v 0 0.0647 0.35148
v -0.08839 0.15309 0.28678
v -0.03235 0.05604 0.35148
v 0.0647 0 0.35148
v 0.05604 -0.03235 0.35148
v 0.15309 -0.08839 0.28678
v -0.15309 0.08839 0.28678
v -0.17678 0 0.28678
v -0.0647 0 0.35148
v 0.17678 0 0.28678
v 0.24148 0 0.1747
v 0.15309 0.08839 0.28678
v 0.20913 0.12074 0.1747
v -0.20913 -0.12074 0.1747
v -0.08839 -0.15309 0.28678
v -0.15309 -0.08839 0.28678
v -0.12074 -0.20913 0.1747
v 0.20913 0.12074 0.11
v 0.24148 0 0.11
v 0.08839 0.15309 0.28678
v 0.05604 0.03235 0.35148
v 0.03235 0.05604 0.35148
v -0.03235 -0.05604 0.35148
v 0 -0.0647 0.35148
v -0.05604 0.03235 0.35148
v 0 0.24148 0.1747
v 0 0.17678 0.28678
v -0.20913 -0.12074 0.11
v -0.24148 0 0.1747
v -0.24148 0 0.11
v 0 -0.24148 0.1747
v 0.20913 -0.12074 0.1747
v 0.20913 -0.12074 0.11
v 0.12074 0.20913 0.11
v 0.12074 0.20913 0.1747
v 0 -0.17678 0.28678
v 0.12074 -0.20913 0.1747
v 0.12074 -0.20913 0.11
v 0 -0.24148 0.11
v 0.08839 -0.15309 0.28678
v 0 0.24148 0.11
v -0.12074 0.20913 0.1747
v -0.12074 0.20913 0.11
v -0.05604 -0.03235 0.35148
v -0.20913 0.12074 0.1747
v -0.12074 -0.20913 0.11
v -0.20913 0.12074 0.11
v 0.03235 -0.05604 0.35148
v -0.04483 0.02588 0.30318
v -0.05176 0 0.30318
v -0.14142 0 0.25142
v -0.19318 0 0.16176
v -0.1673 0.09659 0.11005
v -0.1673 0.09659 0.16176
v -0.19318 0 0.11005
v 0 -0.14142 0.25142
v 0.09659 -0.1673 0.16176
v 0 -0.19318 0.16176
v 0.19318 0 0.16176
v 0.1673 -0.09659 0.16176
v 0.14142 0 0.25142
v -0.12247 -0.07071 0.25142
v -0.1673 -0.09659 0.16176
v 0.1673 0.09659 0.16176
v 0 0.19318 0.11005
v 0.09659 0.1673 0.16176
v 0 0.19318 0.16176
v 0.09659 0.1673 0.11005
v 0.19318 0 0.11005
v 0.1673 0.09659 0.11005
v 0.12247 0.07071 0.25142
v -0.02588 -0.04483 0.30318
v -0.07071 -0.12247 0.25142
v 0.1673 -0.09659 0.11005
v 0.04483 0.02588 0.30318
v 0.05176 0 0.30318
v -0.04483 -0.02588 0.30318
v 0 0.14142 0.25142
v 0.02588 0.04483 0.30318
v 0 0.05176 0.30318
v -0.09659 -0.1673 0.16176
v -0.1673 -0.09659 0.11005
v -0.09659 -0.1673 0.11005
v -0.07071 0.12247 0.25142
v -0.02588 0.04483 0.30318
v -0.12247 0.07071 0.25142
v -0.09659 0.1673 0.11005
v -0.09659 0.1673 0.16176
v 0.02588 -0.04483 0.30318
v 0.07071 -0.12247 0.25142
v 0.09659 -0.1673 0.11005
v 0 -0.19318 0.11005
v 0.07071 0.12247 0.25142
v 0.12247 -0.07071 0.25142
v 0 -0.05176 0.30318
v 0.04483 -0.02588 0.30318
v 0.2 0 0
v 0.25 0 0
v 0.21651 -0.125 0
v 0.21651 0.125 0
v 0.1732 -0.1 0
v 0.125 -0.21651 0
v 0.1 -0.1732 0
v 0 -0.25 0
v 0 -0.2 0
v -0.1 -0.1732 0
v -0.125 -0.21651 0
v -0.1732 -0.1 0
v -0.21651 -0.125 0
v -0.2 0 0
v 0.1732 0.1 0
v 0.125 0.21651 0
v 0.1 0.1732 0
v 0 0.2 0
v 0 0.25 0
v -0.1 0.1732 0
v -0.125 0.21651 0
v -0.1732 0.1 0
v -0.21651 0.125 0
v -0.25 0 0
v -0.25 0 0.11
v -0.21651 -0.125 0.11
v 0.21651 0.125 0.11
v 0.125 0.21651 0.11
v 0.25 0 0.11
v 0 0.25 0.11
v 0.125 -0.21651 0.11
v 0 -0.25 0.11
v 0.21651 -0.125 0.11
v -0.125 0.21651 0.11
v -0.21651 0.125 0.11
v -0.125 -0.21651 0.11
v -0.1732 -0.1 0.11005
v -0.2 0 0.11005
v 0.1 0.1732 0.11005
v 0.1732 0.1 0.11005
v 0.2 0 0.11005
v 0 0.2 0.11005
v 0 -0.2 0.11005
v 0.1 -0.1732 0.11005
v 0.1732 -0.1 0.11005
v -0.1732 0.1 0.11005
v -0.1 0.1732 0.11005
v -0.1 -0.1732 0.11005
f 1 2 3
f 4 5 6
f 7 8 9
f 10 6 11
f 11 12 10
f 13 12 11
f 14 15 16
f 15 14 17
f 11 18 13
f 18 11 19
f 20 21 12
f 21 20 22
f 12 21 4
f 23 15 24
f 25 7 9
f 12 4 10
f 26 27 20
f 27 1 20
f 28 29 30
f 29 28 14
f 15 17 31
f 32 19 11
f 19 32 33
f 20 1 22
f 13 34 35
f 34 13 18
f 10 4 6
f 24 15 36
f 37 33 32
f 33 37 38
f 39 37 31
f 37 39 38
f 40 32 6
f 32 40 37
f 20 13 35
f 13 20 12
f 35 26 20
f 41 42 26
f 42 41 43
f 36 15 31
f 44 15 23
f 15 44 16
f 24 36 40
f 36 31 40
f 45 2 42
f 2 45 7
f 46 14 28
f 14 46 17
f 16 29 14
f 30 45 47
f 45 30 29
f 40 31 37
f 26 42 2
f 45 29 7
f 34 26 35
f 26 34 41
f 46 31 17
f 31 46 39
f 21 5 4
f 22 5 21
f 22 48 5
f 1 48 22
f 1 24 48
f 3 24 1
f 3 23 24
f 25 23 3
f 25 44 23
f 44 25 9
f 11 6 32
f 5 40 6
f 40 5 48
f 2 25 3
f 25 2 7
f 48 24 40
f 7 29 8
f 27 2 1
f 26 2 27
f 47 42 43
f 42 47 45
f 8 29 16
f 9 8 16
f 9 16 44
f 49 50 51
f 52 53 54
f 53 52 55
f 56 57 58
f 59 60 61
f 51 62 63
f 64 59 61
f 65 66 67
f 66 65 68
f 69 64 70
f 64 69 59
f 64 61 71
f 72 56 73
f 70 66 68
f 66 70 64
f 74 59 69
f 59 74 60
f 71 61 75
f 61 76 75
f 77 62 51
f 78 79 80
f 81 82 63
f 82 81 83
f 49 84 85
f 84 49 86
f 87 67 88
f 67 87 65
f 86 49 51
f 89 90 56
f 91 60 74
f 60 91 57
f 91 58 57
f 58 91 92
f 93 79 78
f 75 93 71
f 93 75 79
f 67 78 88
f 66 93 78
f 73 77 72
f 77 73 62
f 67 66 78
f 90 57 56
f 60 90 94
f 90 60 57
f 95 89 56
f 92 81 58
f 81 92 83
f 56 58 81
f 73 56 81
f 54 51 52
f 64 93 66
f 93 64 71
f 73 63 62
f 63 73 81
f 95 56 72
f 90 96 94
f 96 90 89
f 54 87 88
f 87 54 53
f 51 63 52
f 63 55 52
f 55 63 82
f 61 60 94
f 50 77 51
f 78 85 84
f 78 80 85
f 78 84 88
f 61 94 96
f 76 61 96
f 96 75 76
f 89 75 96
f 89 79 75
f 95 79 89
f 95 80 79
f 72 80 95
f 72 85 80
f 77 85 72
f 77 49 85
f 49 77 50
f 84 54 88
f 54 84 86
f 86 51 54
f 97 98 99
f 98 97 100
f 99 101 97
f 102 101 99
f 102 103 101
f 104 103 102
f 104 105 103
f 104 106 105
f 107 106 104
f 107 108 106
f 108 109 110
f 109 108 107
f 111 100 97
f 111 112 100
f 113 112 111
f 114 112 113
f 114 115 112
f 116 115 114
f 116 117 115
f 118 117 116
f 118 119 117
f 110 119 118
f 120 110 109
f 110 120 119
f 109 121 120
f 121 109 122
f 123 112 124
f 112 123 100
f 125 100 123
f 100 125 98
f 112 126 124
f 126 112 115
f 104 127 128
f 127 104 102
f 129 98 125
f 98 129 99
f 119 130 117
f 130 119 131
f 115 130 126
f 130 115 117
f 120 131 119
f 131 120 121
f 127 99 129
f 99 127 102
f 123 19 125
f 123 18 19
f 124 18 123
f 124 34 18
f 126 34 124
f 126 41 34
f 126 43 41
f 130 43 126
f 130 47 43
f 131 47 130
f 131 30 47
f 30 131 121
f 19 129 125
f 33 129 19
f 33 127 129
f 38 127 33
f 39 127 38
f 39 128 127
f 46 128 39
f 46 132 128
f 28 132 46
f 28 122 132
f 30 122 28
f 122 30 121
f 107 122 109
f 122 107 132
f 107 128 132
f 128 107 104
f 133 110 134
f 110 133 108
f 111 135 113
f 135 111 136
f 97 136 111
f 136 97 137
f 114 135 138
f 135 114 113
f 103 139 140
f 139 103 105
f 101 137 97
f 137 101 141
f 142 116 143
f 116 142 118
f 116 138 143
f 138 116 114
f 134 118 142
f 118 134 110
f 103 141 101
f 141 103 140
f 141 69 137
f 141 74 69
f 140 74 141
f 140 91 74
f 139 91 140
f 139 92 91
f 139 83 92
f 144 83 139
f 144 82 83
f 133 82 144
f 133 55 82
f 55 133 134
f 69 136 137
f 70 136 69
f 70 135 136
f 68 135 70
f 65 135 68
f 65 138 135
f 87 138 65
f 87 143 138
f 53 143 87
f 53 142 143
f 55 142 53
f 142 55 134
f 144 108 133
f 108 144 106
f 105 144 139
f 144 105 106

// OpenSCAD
eps = 0.0001;
hole_attach_height = 0.02;
outer_radius = 0.25;
hole_radius = 0.045;
thickness = 0.05;
hole_twist = 0;
//other params
inner_radius = outer_radius - thickness;
fn = 12;
fnh = 6;

difference() {
    union() {
        difference() {
            //sphere
            translate([0,0,hole_radius*2 + hole_attach_height])
            sphere(r=outer_radius, $fn = fn);
            
            //shelling
            translate([0,0,hole_radius*2 + hole_attach_height])
            sphere(r=inner_radius, $fn = fn);
            
            translate([0,0,-outer_radius])
            cylinder(h=outer_radius, r= outer_radius, $fn = fn);
        }
        
        //attach segment
        cylinder(h=hole_radius*2 + hole_attach_height, r = outer_radius, $fn = fn);
    }
    
    translate([0,0,-outer_radius -eps/2])
    cylinder(h=hole_radius*2 + hole_attach_height + outer_radius + eps, r = inner_radius, $fn = fn);
    
//    translate([0,0,hole_attach_height + hole_radius]) 
//    rotate([0,0,hole_twist]){
//        rotate([90,0,0])
//        cylinder(h=outer_radius * 2 + eps, r = hole_radius, center=true, $fn = fnh);
//        rotate([0,90,0])
//        cylinder(h=outer_radius * 2 + eps, r = hole_radius, center=true, $fn = fnh);
//    }
    
}
